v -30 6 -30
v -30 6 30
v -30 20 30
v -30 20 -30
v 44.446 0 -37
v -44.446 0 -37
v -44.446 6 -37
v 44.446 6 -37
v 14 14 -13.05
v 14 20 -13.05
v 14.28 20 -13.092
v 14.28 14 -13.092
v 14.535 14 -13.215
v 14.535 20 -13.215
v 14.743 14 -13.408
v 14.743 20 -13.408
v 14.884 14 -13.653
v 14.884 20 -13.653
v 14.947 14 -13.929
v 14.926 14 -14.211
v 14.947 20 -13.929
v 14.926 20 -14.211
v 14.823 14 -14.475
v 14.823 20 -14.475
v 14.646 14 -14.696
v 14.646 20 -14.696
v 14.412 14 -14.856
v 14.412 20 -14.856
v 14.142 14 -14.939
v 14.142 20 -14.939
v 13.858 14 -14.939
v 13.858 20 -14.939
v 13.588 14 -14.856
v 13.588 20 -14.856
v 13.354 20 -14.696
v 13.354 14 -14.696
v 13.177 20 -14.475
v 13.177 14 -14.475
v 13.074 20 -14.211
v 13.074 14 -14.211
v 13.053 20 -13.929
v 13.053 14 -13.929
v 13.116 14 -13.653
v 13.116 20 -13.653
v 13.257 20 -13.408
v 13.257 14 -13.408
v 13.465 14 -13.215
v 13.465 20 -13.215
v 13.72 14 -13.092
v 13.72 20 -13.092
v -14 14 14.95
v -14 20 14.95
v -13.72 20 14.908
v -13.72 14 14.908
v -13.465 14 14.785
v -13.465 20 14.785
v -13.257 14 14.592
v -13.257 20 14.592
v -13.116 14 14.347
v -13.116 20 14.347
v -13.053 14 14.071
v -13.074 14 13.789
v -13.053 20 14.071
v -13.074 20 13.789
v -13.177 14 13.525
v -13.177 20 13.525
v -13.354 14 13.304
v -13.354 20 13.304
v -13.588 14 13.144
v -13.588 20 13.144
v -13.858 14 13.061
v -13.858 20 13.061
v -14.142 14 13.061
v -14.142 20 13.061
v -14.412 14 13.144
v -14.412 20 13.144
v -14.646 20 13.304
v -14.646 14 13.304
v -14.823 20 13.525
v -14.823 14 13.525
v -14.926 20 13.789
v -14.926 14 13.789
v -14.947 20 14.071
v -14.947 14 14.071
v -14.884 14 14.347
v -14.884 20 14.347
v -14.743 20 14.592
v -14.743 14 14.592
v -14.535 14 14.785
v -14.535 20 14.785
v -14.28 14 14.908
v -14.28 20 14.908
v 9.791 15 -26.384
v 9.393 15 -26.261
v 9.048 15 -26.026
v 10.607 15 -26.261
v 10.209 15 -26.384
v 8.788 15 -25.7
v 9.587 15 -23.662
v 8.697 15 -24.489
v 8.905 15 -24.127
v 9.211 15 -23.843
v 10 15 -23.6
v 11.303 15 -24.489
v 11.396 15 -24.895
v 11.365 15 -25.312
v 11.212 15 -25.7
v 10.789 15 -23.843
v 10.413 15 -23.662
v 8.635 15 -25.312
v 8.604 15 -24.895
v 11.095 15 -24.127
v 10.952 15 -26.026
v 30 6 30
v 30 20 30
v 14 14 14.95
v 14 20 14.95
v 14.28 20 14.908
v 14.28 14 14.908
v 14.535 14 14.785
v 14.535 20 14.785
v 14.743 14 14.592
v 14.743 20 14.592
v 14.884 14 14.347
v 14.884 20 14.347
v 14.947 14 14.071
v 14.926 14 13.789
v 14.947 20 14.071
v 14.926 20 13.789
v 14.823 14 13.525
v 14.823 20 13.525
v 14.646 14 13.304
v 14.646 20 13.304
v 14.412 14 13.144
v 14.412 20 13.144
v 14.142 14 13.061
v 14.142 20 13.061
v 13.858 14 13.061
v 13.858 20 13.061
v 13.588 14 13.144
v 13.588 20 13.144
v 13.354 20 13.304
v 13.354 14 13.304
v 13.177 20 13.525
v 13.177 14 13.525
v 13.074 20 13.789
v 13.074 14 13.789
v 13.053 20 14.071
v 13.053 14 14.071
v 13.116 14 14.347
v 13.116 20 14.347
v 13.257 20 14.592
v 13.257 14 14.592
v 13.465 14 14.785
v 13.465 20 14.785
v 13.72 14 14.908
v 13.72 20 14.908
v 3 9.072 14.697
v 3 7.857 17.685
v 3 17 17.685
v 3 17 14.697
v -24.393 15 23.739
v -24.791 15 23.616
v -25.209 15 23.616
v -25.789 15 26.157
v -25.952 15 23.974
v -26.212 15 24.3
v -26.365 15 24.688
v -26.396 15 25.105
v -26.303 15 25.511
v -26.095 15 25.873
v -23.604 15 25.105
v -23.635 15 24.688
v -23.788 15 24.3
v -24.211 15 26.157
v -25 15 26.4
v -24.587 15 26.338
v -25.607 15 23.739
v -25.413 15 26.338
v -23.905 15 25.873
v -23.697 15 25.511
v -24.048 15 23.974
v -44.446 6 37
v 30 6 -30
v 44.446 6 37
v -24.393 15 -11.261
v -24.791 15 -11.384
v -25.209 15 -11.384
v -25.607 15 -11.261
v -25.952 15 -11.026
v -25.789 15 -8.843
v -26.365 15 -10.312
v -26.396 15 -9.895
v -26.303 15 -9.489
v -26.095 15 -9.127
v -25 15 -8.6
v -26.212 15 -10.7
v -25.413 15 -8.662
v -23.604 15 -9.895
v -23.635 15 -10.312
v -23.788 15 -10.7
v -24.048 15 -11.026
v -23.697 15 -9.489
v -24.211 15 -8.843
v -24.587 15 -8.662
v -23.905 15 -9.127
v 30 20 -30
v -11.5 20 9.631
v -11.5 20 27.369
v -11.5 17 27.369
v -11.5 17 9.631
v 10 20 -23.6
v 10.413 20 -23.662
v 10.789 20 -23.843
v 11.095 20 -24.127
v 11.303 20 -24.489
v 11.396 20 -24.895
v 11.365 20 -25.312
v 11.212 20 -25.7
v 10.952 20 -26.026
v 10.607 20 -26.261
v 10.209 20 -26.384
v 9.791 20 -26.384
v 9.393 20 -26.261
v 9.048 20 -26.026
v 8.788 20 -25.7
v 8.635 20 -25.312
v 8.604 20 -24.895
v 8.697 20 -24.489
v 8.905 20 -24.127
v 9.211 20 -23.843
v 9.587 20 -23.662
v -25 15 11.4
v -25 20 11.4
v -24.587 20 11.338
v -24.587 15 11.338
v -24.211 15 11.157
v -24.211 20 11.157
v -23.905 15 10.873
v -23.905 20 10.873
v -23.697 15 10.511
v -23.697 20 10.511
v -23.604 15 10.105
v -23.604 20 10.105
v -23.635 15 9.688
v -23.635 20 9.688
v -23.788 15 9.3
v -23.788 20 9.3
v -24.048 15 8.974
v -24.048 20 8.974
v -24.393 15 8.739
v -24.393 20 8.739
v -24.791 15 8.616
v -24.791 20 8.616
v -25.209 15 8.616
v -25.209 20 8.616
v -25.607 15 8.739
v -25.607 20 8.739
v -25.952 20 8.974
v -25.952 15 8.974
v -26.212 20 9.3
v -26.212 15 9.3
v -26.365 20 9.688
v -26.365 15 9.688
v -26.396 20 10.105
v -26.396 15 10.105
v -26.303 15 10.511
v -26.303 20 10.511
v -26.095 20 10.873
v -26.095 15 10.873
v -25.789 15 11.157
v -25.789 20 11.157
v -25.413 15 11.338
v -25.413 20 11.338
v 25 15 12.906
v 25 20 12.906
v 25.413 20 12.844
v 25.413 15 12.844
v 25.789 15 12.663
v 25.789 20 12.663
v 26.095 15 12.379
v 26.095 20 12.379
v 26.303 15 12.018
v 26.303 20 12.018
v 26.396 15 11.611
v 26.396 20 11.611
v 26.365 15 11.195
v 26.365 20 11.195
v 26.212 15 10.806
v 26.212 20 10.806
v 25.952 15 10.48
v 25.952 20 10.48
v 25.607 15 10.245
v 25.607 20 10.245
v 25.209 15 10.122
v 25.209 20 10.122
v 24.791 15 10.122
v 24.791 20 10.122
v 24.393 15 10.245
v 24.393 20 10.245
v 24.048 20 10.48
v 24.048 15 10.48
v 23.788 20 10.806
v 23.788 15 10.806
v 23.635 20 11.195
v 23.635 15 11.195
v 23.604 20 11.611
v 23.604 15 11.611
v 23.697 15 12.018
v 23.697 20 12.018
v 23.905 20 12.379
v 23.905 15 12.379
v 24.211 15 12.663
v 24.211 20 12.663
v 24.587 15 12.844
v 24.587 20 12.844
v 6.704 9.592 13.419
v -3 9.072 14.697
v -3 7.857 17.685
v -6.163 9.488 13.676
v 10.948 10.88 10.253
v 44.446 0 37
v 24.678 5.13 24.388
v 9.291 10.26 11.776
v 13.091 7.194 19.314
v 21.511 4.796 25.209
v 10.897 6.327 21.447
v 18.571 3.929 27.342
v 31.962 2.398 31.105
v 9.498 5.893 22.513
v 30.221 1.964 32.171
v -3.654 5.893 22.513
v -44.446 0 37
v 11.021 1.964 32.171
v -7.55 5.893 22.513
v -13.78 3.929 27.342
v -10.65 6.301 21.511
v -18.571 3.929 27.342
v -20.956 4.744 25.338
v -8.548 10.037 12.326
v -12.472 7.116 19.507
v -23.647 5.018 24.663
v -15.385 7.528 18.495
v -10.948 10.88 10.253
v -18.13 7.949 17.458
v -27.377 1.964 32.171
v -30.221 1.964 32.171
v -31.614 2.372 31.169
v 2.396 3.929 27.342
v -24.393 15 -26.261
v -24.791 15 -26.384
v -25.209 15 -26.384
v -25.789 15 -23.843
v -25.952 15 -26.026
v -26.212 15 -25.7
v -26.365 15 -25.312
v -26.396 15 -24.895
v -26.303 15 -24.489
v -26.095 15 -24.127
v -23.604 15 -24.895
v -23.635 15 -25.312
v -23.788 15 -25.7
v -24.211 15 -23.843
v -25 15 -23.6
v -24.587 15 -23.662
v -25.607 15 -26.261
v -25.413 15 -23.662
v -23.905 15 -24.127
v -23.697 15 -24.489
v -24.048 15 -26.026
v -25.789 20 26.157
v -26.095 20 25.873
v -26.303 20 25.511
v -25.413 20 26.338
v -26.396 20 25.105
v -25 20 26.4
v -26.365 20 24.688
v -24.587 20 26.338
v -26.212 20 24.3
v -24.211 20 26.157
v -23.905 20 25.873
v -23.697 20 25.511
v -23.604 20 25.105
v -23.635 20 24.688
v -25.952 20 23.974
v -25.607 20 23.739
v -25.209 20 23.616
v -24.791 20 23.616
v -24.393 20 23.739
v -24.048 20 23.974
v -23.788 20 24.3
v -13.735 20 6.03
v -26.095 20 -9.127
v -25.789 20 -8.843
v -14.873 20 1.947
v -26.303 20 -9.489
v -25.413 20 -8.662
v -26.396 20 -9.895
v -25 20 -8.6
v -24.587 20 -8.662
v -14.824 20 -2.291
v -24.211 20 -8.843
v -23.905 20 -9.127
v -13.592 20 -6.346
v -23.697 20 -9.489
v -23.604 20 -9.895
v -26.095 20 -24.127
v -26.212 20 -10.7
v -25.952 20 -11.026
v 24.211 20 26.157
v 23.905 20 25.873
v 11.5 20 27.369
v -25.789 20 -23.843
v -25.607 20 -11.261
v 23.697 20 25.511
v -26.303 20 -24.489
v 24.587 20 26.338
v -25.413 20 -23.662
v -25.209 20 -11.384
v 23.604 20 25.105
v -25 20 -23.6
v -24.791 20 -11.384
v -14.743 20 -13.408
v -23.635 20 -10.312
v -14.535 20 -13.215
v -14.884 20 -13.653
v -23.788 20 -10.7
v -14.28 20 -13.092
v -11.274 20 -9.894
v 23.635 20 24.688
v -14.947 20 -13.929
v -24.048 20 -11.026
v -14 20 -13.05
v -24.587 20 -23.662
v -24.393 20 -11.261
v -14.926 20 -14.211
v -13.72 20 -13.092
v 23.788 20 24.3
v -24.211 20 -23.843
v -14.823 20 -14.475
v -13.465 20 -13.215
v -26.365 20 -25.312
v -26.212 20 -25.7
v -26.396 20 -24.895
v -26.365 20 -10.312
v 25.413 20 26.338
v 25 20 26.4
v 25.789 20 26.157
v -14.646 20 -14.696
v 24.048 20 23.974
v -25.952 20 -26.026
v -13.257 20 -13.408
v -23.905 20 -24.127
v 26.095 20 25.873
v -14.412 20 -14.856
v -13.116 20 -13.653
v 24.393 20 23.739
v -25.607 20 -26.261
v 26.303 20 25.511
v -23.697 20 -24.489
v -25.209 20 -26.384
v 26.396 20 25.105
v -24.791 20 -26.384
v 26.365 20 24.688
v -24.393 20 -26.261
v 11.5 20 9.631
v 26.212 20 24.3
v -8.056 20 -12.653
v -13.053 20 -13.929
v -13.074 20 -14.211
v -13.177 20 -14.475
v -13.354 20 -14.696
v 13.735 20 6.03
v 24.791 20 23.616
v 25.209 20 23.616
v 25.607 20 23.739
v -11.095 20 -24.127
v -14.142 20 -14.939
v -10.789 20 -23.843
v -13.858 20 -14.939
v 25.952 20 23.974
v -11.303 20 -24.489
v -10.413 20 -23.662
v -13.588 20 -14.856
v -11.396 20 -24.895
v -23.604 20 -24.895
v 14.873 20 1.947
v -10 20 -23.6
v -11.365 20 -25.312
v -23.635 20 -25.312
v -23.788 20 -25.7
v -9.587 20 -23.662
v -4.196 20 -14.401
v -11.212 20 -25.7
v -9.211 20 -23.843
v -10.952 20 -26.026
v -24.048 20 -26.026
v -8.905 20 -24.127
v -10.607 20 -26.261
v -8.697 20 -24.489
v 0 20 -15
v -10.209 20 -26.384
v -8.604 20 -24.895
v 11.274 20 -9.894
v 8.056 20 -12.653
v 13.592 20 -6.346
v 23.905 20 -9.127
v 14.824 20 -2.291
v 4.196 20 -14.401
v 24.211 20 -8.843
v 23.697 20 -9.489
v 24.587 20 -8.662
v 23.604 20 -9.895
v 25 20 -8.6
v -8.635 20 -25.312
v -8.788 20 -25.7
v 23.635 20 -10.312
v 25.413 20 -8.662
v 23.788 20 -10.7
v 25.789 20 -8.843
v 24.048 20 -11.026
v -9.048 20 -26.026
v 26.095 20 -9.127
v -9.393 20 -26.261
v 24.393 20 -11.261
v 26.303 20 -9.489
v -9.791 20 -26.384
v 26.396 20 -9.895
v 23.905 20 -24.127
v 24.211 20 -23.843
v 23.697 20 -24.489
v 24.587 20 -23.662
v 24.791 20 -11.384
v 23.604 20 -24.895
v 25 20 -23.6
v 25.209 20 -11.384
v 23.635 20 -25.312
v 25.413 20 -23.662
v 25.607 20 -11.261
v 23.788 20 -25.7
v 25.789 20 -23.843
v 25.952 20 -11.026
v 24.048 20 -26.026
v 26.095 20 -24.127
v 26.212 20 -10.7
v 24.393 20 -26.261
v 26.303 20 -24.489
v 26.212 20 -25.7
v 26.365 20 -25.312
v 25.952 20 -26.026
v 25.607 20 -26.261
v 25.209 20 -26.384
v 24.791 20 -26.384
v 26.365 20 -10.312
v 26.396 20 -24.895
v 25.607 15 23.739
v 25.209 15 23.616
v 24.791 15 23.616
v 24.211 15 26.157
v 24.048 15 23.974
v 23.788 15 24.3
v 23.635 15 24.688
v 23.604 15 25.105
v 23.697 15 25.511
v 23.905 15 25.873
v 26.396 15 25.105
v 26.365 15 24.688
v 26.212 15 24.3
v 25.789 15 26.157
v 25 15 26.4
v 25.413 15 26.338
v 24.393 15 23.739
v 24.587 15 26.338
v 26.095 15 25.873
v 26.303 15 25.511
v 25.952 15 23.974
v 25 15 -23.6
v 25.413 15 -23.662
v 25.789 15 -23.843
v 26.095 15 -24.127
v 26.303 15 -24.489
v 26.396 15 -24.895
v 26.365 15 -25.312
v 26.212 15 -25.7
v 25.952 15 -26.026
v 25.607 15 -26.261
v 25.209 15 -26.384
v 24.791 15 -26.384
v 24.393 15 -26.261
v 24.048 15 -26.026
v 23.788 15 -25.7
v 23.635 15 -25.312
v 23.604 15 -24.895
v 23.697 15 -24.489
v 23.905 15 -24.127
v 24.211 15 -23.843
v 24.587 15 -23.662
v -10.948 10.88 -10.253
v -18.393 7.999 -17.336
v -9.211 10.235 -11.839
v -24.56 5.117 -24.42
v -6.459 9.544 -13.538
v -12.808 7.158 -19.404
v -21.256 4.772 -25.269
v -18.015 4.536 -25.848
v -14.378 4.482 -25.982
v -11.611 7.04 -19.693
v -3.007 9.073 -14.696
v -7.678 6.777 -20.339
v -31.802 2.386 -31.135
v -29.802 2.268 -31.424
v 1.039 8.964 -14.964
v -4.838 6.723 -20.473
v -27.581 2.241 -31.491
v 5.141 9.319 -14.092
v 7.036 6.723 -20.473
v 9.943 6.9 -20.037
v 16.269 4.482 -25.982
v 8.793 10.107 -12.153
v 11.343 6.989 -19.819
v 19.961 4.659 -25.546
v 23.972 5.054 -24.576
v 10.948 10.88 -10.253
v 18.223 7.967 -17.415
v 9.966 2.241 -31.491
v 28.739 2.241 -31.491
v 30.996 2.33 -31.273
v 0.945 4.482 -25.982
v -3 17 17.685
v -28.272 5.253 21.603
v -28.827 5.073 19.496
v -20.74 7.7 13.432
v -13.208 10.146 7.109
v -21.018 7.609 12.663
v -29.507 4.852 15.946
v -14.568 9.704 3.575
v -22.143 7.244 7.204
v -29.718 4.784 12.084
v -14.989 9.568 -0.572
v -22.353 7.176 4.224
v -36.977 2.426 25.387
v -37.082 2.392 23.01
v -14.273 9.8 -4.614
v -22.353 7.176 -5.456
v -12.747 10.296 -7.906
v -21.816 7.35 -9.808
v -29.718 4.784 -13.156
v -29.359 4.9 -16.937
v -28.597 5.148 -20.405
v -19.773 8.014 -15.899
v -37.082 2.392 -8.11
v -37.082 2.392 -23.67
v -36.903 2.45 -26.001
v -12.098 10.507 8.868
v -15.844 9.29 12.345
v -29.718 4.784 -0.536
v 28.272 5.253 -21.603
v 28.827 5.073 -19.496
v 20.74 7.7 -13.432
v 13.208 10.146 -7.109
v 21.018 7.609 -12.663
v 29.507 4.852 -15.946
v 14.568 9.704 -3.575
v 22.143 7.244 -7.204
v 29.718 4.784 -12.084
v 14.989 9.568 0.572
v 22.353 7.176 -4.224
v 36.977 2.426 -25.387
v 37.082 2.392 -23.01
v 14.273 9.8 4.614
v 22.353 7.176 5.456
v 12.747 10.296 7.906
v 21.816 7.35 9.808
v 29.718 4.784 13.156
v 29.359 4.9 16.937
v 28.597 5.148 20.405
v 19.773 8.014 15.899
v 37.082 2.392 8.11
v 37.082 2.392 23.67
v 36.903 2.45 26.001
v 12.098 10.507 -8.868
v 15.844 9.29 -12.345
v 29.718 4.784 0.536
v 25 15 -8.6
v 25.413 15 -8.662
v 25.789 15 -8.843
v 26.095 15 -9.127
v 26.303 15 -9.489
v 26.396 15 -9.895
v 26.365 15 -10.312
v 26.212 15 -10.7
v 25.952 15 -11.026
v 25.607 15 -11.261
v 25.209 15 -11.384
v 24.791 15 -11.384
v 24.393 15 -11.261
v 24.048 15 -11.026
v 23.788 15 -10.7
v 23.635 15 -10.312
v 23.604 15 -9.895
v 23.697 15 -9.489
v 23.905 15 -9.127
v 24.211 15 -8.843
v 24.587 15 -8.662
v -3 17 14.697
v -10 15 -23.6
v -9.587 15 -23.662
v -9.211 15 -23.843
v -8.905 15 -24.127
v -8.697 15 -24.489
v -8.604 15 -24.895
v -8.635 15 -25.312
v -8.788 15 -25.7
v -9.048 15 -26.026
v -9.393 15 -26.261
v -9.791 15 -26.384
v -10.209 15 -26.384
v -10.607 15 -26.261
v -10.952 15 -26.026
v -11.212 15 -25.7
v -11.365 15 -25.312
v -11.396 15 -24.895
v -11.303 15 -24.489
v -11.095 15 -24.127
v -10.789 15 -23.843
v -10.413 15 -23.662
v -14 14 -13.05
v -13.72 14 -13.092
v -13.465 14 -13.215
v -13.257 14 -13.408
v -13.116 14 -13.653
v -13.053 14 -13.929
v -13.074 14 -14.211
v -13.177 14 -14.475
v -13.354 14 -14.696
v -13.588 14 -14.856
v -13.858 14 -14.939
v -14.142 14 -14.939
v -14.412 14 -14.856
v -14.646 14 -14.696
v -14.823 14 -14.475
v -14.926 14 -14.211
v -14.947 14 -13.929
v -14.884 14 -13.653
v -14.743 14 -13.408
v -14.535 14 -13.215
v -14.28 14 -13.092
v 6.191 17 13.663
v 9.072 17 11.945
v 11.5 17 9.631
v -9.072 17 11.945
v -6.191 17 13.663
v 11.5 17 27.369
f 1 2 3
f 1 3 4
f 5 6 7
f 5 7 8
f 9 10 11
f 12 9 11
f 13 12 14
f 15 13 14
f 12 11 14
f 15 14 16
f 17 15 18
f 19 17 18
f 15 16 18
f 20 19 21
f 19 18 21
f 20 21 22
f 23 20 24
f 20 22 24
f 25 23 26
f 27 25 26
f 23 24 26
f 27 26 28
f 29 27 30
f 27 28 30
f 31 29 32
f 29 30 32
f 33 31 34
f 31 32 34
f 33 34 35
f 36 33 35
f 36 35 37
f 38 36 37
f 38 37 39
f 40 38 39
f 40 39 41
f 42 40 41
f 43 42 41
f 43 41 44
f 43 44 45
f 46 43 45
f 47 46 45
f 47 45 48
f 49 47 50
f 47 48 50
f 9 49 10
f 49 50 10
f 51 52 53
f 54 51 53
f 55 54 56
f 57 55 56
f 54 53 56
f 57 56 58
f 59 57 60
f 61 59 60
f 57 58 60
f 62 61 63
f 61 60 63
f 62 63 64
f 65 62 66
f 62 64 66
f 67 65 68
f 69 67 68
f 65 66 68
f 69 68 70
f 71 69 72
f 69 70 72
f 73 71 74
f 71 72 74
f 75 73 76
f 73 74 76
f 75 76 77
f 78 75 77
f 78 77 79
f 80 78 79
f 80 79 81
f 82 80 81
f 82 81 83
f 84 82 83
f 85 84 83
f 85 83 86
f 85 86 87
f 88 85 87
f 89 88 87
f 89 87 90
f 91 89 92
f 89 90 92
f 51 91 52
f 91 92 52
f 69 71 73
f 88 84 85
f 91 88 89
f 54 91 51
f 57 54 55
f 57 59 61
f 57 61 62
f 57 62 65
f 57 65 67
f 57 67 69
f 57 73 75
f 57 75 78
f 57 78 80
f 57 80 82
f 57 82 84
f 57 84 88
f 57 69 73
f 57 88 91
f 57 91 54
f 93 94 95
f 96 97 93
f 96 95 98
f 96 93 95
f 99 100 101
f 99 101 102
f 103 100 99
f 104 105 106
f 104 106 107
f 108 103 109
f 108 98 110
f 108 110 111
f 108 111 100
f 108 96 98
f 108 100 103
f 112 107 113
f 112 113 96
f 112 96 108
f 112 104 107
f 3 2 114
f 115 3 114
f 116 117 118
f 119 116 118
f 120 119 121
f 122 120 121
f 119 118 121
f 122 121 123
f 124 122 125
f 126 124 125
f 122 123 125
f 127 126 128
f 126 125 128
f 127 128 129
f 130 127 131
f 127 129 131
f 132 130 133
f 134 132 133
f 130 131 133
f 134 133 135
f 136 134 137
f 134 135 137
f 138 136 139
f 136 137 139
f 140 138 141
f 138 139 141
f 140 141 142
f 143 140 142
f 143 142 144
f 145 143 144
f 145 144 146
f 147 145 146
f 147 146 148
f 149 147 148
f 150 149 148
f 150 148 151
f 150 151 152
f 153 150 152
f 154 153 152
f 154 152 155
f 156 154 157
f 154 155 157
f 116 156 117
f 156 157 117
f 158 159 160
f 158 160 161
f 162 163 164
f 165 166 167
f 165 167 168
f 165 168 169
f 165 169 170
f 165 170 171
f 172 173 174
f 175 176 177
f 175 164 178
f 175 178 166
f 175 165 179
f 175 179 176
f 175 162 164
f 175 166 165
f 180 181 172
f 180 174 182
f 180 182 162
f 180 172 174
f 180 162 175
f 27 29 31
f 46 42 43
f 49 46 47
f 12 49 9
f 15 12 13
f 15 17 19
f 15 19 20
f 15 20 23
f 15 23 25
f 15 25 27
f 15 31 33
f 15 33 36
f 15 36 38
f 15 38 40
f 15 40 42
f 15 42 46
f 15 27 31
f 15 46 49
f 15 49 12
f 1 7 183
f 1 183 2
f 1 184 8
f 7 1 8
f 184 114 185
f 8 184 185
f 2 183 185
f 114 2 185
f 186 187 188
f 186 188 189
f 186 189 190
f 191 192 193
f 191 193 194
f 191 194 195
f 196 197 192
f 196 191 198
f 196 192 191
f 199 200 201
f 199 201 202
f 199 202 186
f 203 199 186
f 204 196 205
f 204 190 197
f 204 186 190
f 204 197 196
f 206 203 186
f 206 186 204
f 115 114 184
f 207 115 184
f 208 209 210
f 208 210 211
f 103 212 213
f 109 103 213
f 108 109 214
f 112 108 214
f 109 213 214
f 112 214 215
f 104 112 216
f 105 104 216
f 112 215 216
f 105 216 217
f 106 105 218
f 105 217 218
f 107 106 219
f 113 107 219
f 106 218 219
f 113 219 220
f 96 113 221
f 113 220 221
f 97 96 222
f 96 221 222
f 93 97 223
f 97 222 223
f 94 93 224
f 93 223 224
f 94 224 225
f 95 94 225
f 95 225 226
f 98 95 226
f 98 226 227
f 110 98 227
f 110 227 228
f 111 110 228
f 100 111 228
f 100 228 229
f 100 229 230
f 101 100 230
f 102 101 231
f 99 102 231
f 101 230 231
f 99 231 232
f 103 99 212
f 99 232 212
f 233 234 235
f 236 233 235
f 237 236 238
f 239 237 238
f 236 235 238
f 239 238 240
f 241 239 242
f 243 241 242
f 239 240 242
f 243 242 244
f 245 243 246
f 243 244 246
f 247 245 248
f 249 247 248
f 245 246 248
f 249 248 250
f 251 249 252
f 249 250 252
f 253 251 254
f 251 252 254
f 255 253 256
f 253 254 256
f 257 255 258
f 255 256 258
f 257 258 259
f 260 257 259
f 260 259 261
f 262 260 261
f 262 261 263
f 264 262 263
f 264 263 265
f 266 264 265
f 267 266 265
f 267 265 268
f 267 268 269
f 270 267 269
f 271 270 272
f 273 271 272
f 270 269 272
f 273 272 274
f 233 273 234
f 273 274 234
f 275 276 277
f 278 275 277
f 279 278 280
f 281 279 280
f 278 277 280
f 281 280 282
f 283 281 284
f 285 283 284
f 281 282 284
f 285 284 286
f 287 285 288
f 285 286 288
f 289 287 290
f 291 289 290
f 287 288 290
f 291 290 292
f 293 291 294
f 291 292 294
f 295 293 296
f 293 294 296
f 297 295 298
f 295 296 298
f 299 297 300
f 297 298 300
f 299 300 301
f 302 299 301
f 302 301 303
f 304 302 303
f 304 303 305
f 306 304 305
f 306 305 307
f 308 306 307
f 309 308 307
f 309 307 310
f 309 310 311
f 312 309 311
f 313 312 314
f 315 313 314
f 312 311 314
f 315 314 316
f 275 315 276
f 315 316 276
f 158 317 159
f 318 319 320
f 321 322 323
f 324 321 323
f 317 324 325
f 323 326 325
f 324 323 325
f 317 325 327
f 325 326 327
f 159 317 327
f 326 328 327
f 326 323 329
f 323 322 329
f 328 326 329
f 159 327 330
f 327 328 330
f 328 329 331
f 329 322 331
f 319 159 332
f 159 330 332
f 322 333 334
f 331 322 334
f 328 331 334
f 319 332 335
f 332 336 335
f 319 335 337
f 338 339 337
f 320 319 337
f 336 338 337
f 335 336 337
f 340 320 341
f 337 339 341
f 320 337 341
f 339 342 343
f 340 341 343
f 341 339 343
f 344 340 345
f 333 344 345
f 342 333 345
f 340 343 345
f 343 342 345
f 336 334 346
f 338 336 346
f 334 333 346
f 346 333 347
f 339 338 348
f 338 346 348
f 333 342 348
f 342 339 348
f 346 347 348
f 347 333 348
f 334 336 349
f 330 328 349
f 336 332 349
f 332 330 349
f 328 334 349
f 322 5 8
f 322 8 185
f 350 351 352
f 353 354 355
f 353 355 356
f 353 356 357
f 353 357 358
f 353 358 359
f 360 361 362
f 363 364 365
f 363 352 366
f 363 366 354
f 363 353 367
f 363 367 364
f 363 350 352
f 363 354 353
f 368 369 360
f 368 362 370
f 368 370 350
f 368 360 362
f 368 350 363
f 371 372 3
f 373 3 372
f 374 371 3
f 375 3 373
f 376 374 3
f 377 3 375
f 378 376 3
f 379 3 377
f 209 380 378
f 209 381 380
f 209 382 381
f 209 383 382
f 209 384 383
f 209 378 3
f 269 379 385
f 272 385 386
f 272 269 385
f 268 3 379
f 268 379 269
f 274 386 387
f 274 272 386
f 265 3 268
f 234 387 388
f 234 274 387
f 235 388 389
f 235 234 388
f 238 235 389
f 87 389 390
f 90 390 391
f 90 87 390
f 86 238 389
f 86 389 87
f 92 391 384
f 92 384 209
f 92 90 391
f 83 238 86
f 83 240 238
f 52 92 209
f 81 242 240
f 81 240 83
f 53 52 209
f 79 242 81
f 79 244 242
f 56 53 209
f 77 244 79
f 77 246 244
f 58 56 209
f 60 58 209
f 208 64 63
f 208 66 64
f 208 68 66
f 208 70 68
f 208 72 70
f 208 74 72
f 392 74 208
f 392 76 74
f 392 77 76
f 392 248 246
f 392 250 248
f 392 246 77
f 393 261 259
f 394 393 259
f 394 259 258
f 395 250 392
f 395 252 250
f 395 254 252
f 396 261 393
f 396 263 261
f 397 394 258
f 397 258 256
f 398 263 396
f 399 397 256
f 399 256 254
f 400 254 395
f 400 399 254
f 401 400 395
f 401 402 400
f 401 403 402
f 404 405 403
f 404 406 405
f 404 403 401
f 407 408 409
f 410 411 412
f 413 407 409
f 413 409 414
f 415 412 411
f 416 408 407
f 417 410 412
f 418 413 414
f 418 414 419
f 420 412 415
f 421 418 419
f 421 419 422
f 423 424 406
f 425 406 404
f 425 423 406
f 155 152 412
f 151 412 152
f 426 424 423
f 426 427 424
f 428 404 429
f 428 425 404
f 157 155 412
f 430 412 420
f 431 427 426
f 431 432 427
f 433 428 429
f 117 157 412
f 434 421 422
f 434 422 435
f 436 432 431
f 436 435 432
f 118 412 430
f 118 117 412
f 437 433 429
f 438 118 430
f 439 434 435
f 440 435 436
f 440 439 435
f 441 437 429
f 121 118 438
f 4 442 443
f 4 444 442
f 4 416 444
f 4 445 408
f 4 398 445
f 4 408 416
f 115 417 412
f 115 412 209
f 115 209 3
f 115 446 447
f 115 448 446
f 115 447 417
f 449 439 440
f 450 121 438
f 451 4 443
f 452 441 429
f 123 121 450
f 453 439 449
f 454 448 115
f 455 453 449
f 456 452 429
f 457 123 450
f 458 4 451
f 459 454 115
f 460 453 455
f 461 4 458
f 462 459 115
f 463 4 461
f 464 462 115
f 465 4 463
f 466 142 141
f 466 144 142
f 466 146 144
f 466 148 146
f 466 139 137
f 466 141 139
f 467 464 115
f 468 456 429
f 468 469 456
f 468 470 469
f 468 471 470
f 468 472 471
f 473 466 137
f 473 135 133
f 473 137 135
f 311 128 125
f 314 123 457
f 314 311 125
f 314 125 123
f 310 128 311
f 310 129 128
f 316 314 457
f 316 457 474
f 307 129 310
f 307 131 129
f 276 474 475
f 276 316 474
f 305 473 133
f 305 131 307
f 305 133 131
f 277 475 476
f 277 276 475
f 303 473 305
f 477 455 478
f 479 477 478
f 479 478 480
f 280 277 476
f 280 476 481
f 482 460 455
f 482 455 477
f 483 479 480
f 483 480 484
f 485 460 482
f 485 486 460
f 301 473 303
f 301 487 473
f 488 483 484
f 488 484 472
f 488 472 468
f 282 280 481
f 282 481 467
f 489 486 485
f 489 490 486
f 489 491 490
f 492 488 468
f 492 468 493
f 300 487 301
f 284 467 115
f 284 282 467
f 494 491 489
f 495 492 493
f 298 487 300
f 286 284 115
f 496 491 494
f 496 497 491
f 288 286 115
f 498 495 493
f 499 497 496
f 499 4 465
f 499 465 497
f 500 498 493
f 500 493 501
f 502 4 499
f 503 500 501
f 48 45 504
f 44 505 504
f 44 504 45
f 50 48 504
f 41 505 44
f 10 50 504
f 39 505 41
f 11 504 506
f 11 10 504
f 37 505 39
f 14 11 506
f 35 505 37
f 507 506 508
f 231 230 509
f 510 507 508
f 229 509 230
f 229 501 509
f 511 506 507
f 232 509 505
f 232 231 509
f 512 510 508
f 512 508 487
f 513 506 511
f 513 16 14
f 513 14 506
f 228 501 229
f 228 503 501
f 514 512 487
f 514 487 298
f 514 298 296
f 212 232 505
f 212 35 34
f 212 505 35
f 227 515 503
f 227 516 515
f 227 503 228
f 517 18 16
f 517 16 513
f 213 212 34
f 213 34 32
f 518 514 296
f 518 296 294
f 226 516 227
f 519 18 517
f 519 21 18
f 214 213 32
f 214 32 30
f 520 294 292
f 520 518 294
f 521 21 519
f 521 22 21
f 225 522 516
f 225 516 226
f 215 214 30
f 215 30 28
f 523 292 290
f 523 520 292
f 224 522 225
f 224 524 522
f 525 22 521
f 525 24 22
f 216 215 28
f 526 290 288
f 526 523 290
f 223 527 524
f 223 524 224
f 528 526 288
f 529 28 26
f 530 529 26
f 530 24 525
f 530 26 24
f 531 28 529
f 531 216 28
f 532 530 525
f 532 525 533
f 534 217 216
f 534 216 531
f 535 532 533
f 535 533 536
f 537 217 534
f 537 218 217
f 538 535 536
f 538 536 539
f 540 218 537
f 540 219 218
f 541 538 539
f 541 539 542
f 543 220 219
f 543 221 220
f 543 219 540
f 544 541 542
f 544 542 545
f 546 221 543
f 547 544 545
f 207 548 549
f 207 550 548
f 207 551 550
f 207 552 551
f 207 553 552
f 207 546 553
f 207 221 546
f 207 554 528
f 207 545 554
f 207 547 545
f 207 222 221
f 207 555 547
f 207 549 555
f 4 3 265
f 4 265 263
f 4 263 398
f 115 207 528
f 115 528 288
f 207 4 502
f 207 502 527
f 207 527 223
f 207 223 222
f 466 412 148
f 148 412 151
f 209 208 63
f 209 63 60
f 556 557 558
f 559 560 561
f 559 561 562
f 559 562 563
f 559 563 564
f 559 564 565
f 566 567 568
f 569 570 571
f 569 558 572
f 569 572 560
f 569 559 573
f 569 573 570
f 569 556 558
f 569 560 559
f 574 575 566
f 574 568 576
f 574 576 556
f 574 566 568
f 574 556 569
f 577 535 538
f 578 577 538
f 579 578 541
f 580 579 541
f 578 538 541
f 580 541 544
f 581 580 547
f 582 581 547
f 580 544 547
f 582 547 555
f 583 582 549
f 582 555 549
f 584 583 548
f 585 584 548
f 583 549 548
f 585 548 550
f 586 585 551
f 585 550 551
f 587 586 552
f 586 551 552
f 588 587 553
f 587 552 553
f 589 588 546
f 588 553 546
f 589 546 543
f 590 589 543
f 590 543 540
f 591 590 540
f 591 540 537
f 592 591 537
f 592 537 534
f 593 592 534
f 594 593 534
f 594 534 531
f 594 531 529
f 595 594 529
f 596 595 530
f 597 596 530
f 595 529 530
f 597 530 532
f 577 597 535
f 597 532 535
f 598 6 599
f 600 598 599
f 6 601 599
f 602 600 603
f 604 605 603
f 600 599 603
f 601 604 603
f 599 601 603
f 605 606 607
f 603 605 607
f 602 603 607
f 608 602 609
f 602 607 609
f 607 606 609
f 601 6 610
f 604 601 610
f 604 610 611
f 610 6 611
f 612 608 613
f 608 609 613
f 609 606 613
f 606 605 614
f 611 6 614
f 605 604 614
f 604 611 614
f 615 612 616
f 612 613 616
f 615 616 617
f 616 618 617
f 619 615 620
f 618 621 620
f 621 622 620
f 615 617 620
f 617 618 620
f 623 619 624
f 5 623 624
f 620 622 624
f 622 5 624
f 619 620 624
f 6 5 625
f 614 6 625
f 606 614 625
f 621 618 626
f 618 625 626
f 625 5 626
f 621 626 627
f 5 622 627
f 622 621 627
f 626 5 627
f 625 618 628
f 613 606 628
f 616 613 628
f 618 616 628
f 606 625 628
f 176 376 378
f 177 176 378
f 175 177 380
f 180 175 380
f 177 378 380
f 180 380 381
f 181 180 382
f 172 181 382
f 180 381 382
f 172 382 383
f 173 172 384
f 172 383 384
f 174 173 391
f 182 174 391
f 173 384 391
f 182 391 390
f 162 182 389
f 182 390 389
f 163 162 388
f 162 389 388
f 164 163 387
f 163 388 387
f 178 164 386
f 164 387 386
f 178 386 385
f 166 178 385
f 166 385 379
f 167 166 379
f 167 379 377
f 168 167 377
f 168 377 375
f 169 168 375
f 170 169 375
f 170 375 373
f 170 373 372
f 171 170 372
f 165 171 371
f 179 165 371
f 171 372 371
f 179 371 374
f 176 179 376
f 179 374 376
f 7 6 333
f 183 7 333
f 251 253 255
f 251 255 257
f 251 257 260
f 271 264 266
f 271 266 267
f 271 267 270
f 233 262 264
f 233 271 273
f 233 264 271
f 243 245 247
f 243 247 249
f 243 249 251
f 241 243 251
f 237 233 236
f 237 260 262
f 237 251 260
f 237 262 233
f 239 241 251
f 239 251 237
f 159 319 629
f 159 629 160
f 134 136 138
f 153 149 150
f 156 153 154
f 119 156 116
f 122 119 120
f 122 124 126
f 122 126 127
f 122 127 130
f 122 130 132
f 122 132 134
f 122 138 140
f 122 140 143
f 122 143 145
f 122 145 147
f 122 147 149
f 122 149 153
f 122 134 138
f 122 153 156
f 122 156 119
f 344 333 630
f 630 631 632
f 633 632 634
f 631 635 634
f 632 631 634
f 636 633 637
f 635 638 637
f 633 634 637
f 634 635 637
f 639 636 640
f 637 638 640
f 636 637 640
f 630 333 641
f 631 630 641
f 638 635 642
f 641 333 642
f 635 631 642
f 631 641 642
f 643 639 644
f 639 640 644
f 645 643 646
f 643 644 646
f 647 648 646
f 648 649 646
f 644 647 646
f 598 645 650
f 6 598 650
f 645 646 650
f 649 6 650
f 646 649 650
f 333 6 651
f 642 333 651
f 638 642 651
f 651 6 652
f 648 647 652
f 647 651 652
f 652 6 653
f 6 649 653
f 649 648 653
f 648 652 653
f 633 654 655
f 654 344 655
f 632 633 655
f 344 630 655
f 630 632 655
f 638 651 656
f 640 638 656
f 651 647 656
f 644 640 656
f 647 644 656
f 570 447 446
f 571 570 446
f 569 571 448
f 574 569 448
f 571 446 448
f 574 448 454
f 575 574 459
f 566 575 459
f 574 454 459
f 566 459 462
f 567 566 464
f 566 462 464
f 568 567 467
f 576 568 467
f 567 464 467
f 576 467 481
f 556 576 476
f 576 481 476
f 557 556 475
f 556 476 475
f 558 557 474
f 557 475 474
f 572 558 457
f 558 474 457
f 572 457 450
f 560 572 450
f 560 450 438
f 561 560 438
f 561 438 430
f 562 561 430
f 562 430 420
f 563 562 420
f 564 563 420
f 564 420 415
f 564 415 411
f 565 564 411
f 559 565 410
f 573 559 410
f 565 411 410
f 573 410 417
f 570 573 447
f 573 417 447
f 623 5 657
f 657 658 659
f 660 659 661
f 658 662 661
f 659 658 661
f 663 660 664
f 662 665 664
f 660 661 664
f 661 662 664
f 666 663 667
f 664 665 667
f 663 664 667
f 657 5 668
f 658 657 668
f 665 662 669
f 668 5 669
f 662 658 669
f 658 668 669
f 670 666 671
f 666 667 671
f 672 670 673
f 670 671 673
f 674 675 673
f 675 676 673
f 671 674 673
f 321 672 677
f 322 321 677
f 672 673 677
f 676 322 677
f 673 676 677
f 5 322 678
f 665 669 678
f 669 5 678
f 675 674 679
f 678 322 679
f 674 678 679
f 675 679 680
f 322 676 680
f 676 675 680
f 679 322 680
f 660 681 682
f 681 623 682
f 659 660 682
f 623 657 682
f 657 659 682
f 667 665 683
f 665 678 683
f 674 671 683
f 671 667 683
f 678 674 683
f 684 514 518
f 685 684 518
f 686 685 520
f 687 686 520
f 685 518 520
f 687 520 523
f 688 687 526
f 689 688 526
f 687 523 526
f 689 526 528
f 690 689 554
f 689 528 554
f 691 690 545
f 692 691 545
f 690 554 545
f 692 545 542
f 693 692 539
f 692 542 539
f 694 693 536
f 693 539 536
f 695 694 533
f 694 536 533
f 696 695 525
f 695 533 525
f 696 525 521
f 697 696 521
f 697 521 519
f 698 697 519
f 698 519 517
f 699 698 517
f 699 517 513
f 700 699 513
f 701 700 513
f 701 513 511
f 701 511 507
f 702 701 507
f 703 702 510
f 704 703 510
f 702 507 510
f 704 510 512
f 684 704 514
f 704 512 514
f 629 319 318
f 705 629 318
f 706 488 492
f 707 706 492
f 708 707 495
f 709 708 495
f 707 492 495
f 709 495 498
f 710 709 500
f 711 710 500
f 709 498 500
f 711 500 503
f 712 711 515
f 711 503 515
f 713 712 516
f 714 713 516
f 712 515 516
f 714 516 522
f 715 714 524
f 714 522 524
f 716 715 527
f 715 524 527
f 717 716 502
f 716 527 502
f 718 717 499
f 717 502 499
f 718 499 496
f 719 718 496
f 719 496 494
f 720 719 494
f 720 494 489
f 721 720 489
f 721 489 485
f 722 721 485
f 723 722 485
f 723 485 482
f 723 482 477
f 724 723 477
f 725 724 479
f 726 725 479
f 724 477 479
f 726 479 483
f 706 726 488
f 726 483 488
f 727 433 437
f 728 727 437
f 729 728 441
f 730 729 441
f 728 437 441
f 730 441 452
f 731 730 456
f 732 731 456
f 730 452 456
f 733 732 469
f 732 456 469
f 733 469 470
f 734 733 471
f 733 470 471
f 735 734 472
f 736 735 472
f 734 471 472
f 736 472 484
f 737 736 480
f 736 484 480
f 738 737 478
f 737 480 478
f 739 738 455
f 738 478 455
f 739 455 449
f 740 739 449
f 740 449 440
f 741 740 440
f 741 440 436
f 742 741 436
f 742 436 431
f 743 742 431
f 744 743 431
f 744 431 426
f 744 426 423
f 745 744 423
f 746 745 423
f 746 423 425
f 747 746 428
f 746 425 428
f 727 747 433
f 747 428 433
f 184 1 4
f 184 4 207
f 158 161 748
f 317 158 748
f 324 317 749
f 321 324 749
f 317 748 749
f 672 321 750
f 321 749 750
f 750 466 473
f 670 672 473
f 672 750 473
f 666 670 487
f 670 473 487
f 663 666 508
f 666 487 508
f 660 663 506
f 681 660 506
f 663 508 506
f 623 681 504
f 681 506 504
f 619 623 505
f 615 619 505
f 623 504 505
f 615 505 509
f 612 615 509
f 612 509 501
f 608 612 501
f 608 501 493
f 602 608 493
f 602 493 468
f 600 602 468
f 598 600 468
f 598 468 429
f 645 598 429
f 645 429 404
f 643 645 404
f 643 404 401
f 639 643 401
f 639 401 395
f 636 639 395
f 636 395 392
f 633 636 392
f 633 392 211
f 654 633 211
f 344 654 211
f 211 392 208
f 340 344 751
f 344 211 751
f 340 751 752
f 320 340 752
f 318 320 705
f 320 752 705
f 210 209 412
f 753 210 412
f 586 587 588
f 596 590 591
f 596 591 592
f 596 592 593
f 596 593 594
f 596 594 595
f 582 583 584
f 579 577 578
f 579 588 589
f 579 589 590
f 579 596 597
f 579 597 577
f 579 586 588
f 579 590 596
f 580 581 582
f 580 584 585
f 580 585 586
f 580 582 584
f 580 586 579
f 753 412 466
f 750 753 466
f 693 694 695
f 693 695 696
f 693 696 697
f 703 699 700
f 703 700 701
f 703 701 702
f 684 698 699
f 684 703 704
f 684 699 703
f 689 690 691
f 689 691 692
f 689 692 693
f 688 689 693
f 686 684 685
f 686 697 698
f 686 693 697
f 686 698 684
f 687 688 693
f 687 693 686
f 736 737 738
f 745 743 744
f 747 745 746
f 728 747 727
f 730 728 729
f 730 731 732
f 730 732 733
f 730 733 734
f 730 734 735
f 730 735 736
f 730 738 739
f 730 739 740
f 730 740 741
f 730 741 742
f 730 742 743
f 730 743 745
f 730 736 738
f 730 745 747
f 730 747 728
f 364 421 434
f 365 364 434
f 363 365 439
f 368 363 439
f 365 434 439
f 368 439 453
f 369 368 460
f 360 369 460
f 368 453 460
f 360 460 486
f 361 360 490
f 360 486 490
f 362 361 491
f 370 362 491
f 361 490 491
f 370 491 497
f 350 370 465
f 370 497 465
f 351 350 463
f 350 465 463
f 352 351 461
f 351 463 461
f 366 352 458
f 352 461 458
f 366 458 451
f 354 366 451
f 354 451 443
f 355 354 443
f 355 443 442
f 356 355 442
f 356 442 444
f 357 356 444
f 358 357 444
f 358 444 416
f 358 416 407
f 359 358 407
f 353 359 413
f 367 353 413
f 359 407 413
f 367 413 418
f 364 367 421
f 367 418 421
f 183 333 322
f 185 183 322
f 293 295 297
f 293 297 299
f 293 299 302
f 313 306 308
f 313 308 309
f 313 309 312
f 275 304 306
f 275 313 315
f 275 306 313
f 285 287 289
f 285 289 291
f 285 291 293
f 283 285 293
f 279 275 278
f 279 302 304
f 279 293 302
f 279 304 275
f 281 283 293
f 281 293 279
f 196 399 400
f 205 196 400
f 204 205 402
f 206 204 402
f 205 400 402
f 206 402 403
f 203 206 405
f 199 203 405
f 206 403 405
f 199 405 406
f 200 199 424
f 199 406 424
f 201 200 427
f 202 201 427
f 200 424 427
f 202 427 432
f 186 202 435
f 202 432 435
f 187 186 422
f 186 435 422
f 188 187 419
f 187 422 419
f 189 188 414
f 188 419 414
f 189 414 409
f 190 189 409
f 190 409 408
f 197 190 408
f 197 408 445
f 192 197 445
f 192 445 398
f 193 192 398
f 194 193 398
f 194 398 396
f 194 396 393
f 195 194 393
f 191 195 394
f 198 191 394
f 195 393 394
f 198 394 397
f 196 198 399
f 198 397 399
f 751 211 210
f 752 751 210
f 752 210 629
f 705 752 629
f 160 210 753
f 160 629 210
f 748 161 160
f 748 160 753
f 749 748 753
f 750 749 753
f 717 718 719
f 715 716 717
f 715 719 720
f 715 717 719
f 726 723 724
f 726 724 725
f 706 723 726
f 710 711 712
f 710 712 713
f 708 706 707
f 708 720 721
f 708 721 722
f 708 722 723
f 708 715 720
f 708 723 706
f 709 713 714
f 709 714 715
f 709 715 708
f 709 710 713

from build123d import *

# Parameters (mm, degrees)
SKETCH1_W           = 60
SKETCH1_H           = 60
BOSS_EXTRUDE1_DEPTH = 20
SKETCH10_W          = 15
SKETCH10_H          = 15
CUT_EXTRUDE4_DEPTH  = 8
SKETCH9_W           = 88.892246252
SKETCH9_H           = 74
SKETCH9_W_2         = 60
SKETCH9_H_2         = 60
BOSS_EXTRUDE4_DEPTH = 6
SKETCH2_R           = 15
CUT_EXTRUDE5_DEPTH  = 62.191975628
SKETCH11_R          = 0.95
CUT_EXTRUDE6_DEPTH  = 6
SKETCH12_W          = 23
SKETCH12_H          = 10.738639716
CUT_EXTRUDE7_DEPTH  = 3
SKETCH13_W          = 23
SKETCH13_H          = 7
CUT_EXTRUDE8_DEPTH  = 3
SKETCH14_R          = 1.4
CUT_EXTRUDE9_DEPTH  = 5
SKETCH15_W          = 6
SKETCH15_H          = 8
CUT_EXTRUDE10_DEPTH = 61.278170847


with BuildPart() as part:
    # Sketch1 → Boss-Extrude1 (new body)
    with BuildSketch(Plane(origin=(0, 0, 0), x_dir=(1, 0, 0), z_dir=(0, 1, 0))):
        Rectangle(SKETCH1_W, SKETCH1_H)
    extrude(amount=BOSS_EXTRUDE1_DEPTH)

    # Sketch10 → Cut-Extrude4 (cut)
    with BuildSketch(Plane(origin=(0, 20, 0), x_dir=(1, 0, 0), z_dir=(0, 1, 0))):
        Rectangle(SKETCH10_W, SKETCH10_H)
    extrude(amount=-CUT_EXTRUDE4_DEPTH, mode=Mode.SUBTRACT)

    # Sketch9 → Boss-Extrude4 (add)
    with BuildSketch(Plane.XZ):
        Rectangle(SKETCH9_W, SKETCH9_H)
        Rectangle(SKETCH9_W_2, SKETCH9_H_2, mode=Mode.SUBTRACT)
    extrude(amount=-BOSS_EXTRUDE4_DEPTH)

    # Cut-Loft2: read off the stored shape, not the designer's step
    # Cut-Loft2: loft between two sections, ruled curve by curve
    cut_loft2_from = [
        Edge.make_line((-7.5, 12, -7.5), (7.5, 12, -7.5)),
        Edge.make_line((7.5, 12, -7.5), (7.5, 12, 7.5)),
        Edge.make_line((-7.5, 12, 7.5), (-7.5, 12, -7.5)),
        Edge.make_line((7.5, 12, 7.5), (-7.5, 12, 7.5)),
    ]
    cut_loft2_to = [
        Edge.make_line((-44.446123126, 0, -37), (44.446123126, 0, -37)),
        Edge.make_line((44.446123126, 0, -37), (44.446123126, 0, 37)),
        Edge.make_line((-44.446123126, 0, 37), (-44.446123126, 0, -37)),
        Edge.make_line((44.446123126, 0, 37), (-44.446123126, 0, 37)),
    ]
    cut_loft2 = Solid(Shell([*[Face.make_surface_from_curves(cut_loft2_from[k], cut_loft2_to[k]) for k in range(4)], Face(Wire(cut_loft2_from)), Face(Wire(cut_loft2_to))]))
    add(cut_loft2, mode=Mode.SUBTRACT)

    # Sketch2 → Cut-Extrude5 (cut, through all)
    with BuildSketch(Plane(origin=(0, 20, 0), x_dir=(1, 0, 0), z_dir=(0, 1, 0))):
        with Locations(Location((0, 0, 0), (0, 0, 270))):
            Circle(SKETCH2_R)
    extrude(amount=-CUT_EXTRUDE5_DEPTH, mode=Mode.SUBTRACT)

    # Sketch11 → Cut-Extrude6 (cut)
    with BuildSketch(Plane(origin=(0, 20, 0), x_dir=(1, 0, 0), z_dir=(0, 1, 0))):
        with Locations(Location((-14, 14, 0), (0, 0, 270))):
            Circle(SKETCH11_R)
        with Locations(Location((14, 14, 0), (0, 0, 270))):
            Circle(SKETCH11_R)
        with Locations(Location((14, -14, 0), (0, 0, 270))):
            Circle(SKETCH11_R)
        with Locations(Location((-14, -14, 0), (0, 0, 270))):
            Circle(SKETCH11_R)
    extrude(amount=-CUT_EXTRUDE6_DEPTH, mode=Mode.SUBTRACT)

    # Sketch12 → Cut-Extrude7 (cut)
    with BuildSketch(Plane(origin=(0, 20, 0), x_dir=(1, 0, 0), z_dir=(0, 1, 0))):
        with Locations((0, -15)):
            Rectangle(SKETCH12_W, SKETCH12_H)
    extrude(amount=-CUT_EXTRUDE7_DEPTH, mode=Mode.SUBTRACT)

    # Sketch13 → Cut-Extrude8 (cut)
    with BuildSketch(Plane(origin=(0, 20, 0), x_dir=(1, 0, 0), z_dir=(0, 1, 0))):
        with Locations((0, -23.869319858)):
            Rectangle(SKETCH13_W, SKETCH13_H)
    extrude(amount=-CUT_EXTRUDE8_DEPTH, mode=Mode.SUBTRACT)

    # Sketch14 → Cut-Extrude9 (cut)
    with BuildSketch(Plane(origin=(0, 20, 0), x_dir=(1, 0, 0), z_dir=(0, 1, 0))):
        with Locations(Location((-25, 25, 0), (0, 0, 270))):
            Circle(SKETCH14_R)
        with Locations(Location((25, 25, 0), (0, 0, 270))):
            Circle(SKETCH14_R)
        with Locations(Location((25, -25, 0), (0, 0, 270))):
            Circle(SKETCH14_R)
        with Locations(Location((-25, -25, 0), (0, 0, 270))):
            Circle(SKETCH14_R)
        with Locations(Location((-10, 25, 0), (0, 0, 270))):
            Circle(SKETCH14_R)
        with Locations(Location((10, 25, 0), (0, 0, 270))):
            Circle(SKETCH14_R)
        with Locations(Location((-25, 10, 0), (0, 0, 270))):
            Circle(SKETCH14_R)
        with Locations(Location((-25, -10, 0), (0, 0, 270))):
            Circle(SKETCH14_R)
        with Locations(Location((25, 10, 0), (0, 0, 270))):
            Circle(SKETCH14_R)
        with Locations(Location((25, -11.506341958, 0), (0, 0, 270))):
            Circle(SKETCH14_R)
    extrude(amount=-CUT_EXTRUDE9_DEPTH, mode=Mode.SUBTRACT)

    # Sketch15 → Cut-Extrude10 (cut, through all)
    with BuildSketch(Plane(origin=(0, 17, 0), x_dir=(1, 0, 0), z_dir=(0, 1, 0))):
        with Locations((0, -13.684659929)):
            Rectangle(SKETCH15_W, SKETCH15_H)
    extrude(amount=-CUT_EXTRUDE10_DEPTH, mode=Mode.SUBTRACT)


solid = part.part
